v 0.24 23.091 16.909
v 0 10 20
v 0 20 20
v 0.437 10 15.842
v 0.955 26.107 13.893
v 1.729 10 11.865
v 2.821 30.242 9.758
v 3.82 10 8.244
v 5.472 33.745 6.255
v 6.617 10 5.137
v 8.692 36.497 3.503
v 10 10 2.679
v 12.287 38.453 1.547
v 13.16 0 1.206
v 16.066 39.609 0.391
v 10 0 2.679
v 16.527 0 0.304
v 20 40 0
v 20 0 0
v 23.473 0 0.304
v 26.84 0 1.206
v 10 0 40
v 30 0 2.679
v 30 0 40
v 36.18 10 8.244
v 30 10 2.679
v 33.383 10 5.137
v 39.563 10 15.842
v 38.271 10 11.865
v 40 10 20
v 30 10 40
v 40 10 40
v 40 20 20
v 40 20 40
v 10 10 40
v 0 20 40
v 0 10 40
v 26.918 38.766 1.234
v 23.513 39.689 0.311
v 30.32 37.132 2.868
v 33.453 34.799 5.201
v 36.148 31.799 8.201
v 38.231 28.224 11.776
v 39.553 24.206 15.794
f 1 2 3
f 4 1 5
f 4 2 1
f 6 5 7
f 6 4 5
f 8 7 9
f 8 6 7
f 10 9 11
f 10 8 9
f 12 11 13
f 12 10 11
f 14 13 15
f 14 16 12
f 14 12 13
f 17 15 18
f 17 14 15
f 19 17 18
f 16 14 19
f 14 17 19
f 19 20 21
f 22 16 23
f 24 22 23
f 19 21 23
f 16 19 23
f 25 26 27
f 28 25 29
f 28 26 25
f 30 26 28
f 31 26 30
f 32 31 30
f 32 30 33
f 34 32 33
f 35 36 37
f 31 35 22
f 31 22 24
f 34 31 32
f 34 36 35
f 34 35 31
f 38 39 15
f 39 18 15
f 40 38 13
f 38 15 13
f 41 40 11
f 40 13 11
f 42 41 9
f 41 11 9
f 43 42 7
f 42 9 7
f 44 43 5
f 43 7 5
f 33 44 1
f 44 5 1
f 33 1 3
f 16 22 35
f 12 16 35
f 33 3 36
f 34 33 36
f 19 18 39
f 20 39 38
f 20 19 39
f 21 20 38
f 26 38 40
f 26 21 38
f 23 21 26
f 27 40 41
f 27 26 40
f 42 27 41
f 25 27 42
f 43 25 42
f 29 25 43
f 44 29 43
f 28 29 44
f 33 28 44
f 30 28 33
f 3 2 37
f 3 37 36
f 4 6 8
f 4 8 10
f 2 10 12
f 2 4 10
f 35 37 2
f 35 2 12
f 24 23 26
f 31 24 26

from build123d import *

# Parameters (mm, degrees)
SKETCH1_W           = 40
SKETCH1_H           = 40
BOSS_EXTRUDE1_DEPTH = 40
SKETCH2_W           = 10
SKETCH2_H           = 10
CUT_EXTRUDE1_DEPTH  = 40
CUT_EXTRUDE2_DEPTH  = 40
CUT_EXTRUDE3_DEPTH  = 40
CUT_EXTRUDE4_DEPTH  = 40


with BuildPart() as part:
    # Sketch1 → Boss-Extrude1 (new body)
    with BuildSketch(Plane.XY):
        with Locations((20, 20)):
            Rectangle(SKETCH1_W, SKETCH1_H)
    extrude(amount=BOSS_EXTRUDE1_DEPTH)

    # Sketch2 → Cut-Extrude1 (cut)
    with BuildSketch(Plane.XY.offset(40)):
        with Locations((5, 5)):
            Rectangle(SKETCH2_W, SKETCH2_H)
        with Locations((35, 5)):
            Rectangle(SKETCH2_W, SKETCH2_H)
    extrude(amount=-CUT_EXTRUDE1_DEPTH, mode=Mode.SUBTRACT)

    # Sketch3 → Cut-Extrude2 (cut)
    with BuildSketch(Plane.XY.offset(40)):
        with BuildLine():
            Line((0, 40), (0, 20))
            ThreePointArc((0, 20), (5.857864376, 34.142135624), (20, 40))
            Line((20, 40), (0, 40))
        make_face()
        with BuildLine():
            Line((40, 40), (20, 40))
            ThreePointArc((20, 40), (34.142135624, 34.142135624), (40, 20))
            Line((40, 20), (40, 40))
        make_face()
    extrude(amount=-CUT_EXTRUDE2_DEPTH, mode=Mode.SUBTRACT)

    # Sketch4 → Cut-Extrude3 (cut)
    with BuildSketch(Plane(origin=(0, 0, 0), x_dir=(1, 0, 0), z_dir=(0, 1, 0))):
        with BuildLine():
            Line((0, 0), (0, -20))
            ThreePointArc((0, -20), (5.857864376, -5.857864376), (20, 0))
            Line((20, 0), (0, 0))
        make_face()
        with BuildLine():
            Line((40, 0), (20, 0))
            ThreePointArc((20, 0), (34.142135624, -5.857864376), (40, -20))
            Line((40, -20), (40, 0))
        make_face()
    extrude(amount=CUT_EXTRUDE3_DEPTH, mode=Mode.SUBTRACT)

    # Sketch5 → Cut-Extrude4 (cut)
    with BuildSketch(Plane(origin=(0, 0, 0), x_dir=(0, 0, -1), z_dir=(1, 0, 0))):
        Polygon((0, 40), (-20, 20), (-40, 20), (-40, 40), align=None)
    extrude(amount=CUT_EXTRUDE4_DEPTH, mode=Mode.SUBTRACT)


solid = part.part
